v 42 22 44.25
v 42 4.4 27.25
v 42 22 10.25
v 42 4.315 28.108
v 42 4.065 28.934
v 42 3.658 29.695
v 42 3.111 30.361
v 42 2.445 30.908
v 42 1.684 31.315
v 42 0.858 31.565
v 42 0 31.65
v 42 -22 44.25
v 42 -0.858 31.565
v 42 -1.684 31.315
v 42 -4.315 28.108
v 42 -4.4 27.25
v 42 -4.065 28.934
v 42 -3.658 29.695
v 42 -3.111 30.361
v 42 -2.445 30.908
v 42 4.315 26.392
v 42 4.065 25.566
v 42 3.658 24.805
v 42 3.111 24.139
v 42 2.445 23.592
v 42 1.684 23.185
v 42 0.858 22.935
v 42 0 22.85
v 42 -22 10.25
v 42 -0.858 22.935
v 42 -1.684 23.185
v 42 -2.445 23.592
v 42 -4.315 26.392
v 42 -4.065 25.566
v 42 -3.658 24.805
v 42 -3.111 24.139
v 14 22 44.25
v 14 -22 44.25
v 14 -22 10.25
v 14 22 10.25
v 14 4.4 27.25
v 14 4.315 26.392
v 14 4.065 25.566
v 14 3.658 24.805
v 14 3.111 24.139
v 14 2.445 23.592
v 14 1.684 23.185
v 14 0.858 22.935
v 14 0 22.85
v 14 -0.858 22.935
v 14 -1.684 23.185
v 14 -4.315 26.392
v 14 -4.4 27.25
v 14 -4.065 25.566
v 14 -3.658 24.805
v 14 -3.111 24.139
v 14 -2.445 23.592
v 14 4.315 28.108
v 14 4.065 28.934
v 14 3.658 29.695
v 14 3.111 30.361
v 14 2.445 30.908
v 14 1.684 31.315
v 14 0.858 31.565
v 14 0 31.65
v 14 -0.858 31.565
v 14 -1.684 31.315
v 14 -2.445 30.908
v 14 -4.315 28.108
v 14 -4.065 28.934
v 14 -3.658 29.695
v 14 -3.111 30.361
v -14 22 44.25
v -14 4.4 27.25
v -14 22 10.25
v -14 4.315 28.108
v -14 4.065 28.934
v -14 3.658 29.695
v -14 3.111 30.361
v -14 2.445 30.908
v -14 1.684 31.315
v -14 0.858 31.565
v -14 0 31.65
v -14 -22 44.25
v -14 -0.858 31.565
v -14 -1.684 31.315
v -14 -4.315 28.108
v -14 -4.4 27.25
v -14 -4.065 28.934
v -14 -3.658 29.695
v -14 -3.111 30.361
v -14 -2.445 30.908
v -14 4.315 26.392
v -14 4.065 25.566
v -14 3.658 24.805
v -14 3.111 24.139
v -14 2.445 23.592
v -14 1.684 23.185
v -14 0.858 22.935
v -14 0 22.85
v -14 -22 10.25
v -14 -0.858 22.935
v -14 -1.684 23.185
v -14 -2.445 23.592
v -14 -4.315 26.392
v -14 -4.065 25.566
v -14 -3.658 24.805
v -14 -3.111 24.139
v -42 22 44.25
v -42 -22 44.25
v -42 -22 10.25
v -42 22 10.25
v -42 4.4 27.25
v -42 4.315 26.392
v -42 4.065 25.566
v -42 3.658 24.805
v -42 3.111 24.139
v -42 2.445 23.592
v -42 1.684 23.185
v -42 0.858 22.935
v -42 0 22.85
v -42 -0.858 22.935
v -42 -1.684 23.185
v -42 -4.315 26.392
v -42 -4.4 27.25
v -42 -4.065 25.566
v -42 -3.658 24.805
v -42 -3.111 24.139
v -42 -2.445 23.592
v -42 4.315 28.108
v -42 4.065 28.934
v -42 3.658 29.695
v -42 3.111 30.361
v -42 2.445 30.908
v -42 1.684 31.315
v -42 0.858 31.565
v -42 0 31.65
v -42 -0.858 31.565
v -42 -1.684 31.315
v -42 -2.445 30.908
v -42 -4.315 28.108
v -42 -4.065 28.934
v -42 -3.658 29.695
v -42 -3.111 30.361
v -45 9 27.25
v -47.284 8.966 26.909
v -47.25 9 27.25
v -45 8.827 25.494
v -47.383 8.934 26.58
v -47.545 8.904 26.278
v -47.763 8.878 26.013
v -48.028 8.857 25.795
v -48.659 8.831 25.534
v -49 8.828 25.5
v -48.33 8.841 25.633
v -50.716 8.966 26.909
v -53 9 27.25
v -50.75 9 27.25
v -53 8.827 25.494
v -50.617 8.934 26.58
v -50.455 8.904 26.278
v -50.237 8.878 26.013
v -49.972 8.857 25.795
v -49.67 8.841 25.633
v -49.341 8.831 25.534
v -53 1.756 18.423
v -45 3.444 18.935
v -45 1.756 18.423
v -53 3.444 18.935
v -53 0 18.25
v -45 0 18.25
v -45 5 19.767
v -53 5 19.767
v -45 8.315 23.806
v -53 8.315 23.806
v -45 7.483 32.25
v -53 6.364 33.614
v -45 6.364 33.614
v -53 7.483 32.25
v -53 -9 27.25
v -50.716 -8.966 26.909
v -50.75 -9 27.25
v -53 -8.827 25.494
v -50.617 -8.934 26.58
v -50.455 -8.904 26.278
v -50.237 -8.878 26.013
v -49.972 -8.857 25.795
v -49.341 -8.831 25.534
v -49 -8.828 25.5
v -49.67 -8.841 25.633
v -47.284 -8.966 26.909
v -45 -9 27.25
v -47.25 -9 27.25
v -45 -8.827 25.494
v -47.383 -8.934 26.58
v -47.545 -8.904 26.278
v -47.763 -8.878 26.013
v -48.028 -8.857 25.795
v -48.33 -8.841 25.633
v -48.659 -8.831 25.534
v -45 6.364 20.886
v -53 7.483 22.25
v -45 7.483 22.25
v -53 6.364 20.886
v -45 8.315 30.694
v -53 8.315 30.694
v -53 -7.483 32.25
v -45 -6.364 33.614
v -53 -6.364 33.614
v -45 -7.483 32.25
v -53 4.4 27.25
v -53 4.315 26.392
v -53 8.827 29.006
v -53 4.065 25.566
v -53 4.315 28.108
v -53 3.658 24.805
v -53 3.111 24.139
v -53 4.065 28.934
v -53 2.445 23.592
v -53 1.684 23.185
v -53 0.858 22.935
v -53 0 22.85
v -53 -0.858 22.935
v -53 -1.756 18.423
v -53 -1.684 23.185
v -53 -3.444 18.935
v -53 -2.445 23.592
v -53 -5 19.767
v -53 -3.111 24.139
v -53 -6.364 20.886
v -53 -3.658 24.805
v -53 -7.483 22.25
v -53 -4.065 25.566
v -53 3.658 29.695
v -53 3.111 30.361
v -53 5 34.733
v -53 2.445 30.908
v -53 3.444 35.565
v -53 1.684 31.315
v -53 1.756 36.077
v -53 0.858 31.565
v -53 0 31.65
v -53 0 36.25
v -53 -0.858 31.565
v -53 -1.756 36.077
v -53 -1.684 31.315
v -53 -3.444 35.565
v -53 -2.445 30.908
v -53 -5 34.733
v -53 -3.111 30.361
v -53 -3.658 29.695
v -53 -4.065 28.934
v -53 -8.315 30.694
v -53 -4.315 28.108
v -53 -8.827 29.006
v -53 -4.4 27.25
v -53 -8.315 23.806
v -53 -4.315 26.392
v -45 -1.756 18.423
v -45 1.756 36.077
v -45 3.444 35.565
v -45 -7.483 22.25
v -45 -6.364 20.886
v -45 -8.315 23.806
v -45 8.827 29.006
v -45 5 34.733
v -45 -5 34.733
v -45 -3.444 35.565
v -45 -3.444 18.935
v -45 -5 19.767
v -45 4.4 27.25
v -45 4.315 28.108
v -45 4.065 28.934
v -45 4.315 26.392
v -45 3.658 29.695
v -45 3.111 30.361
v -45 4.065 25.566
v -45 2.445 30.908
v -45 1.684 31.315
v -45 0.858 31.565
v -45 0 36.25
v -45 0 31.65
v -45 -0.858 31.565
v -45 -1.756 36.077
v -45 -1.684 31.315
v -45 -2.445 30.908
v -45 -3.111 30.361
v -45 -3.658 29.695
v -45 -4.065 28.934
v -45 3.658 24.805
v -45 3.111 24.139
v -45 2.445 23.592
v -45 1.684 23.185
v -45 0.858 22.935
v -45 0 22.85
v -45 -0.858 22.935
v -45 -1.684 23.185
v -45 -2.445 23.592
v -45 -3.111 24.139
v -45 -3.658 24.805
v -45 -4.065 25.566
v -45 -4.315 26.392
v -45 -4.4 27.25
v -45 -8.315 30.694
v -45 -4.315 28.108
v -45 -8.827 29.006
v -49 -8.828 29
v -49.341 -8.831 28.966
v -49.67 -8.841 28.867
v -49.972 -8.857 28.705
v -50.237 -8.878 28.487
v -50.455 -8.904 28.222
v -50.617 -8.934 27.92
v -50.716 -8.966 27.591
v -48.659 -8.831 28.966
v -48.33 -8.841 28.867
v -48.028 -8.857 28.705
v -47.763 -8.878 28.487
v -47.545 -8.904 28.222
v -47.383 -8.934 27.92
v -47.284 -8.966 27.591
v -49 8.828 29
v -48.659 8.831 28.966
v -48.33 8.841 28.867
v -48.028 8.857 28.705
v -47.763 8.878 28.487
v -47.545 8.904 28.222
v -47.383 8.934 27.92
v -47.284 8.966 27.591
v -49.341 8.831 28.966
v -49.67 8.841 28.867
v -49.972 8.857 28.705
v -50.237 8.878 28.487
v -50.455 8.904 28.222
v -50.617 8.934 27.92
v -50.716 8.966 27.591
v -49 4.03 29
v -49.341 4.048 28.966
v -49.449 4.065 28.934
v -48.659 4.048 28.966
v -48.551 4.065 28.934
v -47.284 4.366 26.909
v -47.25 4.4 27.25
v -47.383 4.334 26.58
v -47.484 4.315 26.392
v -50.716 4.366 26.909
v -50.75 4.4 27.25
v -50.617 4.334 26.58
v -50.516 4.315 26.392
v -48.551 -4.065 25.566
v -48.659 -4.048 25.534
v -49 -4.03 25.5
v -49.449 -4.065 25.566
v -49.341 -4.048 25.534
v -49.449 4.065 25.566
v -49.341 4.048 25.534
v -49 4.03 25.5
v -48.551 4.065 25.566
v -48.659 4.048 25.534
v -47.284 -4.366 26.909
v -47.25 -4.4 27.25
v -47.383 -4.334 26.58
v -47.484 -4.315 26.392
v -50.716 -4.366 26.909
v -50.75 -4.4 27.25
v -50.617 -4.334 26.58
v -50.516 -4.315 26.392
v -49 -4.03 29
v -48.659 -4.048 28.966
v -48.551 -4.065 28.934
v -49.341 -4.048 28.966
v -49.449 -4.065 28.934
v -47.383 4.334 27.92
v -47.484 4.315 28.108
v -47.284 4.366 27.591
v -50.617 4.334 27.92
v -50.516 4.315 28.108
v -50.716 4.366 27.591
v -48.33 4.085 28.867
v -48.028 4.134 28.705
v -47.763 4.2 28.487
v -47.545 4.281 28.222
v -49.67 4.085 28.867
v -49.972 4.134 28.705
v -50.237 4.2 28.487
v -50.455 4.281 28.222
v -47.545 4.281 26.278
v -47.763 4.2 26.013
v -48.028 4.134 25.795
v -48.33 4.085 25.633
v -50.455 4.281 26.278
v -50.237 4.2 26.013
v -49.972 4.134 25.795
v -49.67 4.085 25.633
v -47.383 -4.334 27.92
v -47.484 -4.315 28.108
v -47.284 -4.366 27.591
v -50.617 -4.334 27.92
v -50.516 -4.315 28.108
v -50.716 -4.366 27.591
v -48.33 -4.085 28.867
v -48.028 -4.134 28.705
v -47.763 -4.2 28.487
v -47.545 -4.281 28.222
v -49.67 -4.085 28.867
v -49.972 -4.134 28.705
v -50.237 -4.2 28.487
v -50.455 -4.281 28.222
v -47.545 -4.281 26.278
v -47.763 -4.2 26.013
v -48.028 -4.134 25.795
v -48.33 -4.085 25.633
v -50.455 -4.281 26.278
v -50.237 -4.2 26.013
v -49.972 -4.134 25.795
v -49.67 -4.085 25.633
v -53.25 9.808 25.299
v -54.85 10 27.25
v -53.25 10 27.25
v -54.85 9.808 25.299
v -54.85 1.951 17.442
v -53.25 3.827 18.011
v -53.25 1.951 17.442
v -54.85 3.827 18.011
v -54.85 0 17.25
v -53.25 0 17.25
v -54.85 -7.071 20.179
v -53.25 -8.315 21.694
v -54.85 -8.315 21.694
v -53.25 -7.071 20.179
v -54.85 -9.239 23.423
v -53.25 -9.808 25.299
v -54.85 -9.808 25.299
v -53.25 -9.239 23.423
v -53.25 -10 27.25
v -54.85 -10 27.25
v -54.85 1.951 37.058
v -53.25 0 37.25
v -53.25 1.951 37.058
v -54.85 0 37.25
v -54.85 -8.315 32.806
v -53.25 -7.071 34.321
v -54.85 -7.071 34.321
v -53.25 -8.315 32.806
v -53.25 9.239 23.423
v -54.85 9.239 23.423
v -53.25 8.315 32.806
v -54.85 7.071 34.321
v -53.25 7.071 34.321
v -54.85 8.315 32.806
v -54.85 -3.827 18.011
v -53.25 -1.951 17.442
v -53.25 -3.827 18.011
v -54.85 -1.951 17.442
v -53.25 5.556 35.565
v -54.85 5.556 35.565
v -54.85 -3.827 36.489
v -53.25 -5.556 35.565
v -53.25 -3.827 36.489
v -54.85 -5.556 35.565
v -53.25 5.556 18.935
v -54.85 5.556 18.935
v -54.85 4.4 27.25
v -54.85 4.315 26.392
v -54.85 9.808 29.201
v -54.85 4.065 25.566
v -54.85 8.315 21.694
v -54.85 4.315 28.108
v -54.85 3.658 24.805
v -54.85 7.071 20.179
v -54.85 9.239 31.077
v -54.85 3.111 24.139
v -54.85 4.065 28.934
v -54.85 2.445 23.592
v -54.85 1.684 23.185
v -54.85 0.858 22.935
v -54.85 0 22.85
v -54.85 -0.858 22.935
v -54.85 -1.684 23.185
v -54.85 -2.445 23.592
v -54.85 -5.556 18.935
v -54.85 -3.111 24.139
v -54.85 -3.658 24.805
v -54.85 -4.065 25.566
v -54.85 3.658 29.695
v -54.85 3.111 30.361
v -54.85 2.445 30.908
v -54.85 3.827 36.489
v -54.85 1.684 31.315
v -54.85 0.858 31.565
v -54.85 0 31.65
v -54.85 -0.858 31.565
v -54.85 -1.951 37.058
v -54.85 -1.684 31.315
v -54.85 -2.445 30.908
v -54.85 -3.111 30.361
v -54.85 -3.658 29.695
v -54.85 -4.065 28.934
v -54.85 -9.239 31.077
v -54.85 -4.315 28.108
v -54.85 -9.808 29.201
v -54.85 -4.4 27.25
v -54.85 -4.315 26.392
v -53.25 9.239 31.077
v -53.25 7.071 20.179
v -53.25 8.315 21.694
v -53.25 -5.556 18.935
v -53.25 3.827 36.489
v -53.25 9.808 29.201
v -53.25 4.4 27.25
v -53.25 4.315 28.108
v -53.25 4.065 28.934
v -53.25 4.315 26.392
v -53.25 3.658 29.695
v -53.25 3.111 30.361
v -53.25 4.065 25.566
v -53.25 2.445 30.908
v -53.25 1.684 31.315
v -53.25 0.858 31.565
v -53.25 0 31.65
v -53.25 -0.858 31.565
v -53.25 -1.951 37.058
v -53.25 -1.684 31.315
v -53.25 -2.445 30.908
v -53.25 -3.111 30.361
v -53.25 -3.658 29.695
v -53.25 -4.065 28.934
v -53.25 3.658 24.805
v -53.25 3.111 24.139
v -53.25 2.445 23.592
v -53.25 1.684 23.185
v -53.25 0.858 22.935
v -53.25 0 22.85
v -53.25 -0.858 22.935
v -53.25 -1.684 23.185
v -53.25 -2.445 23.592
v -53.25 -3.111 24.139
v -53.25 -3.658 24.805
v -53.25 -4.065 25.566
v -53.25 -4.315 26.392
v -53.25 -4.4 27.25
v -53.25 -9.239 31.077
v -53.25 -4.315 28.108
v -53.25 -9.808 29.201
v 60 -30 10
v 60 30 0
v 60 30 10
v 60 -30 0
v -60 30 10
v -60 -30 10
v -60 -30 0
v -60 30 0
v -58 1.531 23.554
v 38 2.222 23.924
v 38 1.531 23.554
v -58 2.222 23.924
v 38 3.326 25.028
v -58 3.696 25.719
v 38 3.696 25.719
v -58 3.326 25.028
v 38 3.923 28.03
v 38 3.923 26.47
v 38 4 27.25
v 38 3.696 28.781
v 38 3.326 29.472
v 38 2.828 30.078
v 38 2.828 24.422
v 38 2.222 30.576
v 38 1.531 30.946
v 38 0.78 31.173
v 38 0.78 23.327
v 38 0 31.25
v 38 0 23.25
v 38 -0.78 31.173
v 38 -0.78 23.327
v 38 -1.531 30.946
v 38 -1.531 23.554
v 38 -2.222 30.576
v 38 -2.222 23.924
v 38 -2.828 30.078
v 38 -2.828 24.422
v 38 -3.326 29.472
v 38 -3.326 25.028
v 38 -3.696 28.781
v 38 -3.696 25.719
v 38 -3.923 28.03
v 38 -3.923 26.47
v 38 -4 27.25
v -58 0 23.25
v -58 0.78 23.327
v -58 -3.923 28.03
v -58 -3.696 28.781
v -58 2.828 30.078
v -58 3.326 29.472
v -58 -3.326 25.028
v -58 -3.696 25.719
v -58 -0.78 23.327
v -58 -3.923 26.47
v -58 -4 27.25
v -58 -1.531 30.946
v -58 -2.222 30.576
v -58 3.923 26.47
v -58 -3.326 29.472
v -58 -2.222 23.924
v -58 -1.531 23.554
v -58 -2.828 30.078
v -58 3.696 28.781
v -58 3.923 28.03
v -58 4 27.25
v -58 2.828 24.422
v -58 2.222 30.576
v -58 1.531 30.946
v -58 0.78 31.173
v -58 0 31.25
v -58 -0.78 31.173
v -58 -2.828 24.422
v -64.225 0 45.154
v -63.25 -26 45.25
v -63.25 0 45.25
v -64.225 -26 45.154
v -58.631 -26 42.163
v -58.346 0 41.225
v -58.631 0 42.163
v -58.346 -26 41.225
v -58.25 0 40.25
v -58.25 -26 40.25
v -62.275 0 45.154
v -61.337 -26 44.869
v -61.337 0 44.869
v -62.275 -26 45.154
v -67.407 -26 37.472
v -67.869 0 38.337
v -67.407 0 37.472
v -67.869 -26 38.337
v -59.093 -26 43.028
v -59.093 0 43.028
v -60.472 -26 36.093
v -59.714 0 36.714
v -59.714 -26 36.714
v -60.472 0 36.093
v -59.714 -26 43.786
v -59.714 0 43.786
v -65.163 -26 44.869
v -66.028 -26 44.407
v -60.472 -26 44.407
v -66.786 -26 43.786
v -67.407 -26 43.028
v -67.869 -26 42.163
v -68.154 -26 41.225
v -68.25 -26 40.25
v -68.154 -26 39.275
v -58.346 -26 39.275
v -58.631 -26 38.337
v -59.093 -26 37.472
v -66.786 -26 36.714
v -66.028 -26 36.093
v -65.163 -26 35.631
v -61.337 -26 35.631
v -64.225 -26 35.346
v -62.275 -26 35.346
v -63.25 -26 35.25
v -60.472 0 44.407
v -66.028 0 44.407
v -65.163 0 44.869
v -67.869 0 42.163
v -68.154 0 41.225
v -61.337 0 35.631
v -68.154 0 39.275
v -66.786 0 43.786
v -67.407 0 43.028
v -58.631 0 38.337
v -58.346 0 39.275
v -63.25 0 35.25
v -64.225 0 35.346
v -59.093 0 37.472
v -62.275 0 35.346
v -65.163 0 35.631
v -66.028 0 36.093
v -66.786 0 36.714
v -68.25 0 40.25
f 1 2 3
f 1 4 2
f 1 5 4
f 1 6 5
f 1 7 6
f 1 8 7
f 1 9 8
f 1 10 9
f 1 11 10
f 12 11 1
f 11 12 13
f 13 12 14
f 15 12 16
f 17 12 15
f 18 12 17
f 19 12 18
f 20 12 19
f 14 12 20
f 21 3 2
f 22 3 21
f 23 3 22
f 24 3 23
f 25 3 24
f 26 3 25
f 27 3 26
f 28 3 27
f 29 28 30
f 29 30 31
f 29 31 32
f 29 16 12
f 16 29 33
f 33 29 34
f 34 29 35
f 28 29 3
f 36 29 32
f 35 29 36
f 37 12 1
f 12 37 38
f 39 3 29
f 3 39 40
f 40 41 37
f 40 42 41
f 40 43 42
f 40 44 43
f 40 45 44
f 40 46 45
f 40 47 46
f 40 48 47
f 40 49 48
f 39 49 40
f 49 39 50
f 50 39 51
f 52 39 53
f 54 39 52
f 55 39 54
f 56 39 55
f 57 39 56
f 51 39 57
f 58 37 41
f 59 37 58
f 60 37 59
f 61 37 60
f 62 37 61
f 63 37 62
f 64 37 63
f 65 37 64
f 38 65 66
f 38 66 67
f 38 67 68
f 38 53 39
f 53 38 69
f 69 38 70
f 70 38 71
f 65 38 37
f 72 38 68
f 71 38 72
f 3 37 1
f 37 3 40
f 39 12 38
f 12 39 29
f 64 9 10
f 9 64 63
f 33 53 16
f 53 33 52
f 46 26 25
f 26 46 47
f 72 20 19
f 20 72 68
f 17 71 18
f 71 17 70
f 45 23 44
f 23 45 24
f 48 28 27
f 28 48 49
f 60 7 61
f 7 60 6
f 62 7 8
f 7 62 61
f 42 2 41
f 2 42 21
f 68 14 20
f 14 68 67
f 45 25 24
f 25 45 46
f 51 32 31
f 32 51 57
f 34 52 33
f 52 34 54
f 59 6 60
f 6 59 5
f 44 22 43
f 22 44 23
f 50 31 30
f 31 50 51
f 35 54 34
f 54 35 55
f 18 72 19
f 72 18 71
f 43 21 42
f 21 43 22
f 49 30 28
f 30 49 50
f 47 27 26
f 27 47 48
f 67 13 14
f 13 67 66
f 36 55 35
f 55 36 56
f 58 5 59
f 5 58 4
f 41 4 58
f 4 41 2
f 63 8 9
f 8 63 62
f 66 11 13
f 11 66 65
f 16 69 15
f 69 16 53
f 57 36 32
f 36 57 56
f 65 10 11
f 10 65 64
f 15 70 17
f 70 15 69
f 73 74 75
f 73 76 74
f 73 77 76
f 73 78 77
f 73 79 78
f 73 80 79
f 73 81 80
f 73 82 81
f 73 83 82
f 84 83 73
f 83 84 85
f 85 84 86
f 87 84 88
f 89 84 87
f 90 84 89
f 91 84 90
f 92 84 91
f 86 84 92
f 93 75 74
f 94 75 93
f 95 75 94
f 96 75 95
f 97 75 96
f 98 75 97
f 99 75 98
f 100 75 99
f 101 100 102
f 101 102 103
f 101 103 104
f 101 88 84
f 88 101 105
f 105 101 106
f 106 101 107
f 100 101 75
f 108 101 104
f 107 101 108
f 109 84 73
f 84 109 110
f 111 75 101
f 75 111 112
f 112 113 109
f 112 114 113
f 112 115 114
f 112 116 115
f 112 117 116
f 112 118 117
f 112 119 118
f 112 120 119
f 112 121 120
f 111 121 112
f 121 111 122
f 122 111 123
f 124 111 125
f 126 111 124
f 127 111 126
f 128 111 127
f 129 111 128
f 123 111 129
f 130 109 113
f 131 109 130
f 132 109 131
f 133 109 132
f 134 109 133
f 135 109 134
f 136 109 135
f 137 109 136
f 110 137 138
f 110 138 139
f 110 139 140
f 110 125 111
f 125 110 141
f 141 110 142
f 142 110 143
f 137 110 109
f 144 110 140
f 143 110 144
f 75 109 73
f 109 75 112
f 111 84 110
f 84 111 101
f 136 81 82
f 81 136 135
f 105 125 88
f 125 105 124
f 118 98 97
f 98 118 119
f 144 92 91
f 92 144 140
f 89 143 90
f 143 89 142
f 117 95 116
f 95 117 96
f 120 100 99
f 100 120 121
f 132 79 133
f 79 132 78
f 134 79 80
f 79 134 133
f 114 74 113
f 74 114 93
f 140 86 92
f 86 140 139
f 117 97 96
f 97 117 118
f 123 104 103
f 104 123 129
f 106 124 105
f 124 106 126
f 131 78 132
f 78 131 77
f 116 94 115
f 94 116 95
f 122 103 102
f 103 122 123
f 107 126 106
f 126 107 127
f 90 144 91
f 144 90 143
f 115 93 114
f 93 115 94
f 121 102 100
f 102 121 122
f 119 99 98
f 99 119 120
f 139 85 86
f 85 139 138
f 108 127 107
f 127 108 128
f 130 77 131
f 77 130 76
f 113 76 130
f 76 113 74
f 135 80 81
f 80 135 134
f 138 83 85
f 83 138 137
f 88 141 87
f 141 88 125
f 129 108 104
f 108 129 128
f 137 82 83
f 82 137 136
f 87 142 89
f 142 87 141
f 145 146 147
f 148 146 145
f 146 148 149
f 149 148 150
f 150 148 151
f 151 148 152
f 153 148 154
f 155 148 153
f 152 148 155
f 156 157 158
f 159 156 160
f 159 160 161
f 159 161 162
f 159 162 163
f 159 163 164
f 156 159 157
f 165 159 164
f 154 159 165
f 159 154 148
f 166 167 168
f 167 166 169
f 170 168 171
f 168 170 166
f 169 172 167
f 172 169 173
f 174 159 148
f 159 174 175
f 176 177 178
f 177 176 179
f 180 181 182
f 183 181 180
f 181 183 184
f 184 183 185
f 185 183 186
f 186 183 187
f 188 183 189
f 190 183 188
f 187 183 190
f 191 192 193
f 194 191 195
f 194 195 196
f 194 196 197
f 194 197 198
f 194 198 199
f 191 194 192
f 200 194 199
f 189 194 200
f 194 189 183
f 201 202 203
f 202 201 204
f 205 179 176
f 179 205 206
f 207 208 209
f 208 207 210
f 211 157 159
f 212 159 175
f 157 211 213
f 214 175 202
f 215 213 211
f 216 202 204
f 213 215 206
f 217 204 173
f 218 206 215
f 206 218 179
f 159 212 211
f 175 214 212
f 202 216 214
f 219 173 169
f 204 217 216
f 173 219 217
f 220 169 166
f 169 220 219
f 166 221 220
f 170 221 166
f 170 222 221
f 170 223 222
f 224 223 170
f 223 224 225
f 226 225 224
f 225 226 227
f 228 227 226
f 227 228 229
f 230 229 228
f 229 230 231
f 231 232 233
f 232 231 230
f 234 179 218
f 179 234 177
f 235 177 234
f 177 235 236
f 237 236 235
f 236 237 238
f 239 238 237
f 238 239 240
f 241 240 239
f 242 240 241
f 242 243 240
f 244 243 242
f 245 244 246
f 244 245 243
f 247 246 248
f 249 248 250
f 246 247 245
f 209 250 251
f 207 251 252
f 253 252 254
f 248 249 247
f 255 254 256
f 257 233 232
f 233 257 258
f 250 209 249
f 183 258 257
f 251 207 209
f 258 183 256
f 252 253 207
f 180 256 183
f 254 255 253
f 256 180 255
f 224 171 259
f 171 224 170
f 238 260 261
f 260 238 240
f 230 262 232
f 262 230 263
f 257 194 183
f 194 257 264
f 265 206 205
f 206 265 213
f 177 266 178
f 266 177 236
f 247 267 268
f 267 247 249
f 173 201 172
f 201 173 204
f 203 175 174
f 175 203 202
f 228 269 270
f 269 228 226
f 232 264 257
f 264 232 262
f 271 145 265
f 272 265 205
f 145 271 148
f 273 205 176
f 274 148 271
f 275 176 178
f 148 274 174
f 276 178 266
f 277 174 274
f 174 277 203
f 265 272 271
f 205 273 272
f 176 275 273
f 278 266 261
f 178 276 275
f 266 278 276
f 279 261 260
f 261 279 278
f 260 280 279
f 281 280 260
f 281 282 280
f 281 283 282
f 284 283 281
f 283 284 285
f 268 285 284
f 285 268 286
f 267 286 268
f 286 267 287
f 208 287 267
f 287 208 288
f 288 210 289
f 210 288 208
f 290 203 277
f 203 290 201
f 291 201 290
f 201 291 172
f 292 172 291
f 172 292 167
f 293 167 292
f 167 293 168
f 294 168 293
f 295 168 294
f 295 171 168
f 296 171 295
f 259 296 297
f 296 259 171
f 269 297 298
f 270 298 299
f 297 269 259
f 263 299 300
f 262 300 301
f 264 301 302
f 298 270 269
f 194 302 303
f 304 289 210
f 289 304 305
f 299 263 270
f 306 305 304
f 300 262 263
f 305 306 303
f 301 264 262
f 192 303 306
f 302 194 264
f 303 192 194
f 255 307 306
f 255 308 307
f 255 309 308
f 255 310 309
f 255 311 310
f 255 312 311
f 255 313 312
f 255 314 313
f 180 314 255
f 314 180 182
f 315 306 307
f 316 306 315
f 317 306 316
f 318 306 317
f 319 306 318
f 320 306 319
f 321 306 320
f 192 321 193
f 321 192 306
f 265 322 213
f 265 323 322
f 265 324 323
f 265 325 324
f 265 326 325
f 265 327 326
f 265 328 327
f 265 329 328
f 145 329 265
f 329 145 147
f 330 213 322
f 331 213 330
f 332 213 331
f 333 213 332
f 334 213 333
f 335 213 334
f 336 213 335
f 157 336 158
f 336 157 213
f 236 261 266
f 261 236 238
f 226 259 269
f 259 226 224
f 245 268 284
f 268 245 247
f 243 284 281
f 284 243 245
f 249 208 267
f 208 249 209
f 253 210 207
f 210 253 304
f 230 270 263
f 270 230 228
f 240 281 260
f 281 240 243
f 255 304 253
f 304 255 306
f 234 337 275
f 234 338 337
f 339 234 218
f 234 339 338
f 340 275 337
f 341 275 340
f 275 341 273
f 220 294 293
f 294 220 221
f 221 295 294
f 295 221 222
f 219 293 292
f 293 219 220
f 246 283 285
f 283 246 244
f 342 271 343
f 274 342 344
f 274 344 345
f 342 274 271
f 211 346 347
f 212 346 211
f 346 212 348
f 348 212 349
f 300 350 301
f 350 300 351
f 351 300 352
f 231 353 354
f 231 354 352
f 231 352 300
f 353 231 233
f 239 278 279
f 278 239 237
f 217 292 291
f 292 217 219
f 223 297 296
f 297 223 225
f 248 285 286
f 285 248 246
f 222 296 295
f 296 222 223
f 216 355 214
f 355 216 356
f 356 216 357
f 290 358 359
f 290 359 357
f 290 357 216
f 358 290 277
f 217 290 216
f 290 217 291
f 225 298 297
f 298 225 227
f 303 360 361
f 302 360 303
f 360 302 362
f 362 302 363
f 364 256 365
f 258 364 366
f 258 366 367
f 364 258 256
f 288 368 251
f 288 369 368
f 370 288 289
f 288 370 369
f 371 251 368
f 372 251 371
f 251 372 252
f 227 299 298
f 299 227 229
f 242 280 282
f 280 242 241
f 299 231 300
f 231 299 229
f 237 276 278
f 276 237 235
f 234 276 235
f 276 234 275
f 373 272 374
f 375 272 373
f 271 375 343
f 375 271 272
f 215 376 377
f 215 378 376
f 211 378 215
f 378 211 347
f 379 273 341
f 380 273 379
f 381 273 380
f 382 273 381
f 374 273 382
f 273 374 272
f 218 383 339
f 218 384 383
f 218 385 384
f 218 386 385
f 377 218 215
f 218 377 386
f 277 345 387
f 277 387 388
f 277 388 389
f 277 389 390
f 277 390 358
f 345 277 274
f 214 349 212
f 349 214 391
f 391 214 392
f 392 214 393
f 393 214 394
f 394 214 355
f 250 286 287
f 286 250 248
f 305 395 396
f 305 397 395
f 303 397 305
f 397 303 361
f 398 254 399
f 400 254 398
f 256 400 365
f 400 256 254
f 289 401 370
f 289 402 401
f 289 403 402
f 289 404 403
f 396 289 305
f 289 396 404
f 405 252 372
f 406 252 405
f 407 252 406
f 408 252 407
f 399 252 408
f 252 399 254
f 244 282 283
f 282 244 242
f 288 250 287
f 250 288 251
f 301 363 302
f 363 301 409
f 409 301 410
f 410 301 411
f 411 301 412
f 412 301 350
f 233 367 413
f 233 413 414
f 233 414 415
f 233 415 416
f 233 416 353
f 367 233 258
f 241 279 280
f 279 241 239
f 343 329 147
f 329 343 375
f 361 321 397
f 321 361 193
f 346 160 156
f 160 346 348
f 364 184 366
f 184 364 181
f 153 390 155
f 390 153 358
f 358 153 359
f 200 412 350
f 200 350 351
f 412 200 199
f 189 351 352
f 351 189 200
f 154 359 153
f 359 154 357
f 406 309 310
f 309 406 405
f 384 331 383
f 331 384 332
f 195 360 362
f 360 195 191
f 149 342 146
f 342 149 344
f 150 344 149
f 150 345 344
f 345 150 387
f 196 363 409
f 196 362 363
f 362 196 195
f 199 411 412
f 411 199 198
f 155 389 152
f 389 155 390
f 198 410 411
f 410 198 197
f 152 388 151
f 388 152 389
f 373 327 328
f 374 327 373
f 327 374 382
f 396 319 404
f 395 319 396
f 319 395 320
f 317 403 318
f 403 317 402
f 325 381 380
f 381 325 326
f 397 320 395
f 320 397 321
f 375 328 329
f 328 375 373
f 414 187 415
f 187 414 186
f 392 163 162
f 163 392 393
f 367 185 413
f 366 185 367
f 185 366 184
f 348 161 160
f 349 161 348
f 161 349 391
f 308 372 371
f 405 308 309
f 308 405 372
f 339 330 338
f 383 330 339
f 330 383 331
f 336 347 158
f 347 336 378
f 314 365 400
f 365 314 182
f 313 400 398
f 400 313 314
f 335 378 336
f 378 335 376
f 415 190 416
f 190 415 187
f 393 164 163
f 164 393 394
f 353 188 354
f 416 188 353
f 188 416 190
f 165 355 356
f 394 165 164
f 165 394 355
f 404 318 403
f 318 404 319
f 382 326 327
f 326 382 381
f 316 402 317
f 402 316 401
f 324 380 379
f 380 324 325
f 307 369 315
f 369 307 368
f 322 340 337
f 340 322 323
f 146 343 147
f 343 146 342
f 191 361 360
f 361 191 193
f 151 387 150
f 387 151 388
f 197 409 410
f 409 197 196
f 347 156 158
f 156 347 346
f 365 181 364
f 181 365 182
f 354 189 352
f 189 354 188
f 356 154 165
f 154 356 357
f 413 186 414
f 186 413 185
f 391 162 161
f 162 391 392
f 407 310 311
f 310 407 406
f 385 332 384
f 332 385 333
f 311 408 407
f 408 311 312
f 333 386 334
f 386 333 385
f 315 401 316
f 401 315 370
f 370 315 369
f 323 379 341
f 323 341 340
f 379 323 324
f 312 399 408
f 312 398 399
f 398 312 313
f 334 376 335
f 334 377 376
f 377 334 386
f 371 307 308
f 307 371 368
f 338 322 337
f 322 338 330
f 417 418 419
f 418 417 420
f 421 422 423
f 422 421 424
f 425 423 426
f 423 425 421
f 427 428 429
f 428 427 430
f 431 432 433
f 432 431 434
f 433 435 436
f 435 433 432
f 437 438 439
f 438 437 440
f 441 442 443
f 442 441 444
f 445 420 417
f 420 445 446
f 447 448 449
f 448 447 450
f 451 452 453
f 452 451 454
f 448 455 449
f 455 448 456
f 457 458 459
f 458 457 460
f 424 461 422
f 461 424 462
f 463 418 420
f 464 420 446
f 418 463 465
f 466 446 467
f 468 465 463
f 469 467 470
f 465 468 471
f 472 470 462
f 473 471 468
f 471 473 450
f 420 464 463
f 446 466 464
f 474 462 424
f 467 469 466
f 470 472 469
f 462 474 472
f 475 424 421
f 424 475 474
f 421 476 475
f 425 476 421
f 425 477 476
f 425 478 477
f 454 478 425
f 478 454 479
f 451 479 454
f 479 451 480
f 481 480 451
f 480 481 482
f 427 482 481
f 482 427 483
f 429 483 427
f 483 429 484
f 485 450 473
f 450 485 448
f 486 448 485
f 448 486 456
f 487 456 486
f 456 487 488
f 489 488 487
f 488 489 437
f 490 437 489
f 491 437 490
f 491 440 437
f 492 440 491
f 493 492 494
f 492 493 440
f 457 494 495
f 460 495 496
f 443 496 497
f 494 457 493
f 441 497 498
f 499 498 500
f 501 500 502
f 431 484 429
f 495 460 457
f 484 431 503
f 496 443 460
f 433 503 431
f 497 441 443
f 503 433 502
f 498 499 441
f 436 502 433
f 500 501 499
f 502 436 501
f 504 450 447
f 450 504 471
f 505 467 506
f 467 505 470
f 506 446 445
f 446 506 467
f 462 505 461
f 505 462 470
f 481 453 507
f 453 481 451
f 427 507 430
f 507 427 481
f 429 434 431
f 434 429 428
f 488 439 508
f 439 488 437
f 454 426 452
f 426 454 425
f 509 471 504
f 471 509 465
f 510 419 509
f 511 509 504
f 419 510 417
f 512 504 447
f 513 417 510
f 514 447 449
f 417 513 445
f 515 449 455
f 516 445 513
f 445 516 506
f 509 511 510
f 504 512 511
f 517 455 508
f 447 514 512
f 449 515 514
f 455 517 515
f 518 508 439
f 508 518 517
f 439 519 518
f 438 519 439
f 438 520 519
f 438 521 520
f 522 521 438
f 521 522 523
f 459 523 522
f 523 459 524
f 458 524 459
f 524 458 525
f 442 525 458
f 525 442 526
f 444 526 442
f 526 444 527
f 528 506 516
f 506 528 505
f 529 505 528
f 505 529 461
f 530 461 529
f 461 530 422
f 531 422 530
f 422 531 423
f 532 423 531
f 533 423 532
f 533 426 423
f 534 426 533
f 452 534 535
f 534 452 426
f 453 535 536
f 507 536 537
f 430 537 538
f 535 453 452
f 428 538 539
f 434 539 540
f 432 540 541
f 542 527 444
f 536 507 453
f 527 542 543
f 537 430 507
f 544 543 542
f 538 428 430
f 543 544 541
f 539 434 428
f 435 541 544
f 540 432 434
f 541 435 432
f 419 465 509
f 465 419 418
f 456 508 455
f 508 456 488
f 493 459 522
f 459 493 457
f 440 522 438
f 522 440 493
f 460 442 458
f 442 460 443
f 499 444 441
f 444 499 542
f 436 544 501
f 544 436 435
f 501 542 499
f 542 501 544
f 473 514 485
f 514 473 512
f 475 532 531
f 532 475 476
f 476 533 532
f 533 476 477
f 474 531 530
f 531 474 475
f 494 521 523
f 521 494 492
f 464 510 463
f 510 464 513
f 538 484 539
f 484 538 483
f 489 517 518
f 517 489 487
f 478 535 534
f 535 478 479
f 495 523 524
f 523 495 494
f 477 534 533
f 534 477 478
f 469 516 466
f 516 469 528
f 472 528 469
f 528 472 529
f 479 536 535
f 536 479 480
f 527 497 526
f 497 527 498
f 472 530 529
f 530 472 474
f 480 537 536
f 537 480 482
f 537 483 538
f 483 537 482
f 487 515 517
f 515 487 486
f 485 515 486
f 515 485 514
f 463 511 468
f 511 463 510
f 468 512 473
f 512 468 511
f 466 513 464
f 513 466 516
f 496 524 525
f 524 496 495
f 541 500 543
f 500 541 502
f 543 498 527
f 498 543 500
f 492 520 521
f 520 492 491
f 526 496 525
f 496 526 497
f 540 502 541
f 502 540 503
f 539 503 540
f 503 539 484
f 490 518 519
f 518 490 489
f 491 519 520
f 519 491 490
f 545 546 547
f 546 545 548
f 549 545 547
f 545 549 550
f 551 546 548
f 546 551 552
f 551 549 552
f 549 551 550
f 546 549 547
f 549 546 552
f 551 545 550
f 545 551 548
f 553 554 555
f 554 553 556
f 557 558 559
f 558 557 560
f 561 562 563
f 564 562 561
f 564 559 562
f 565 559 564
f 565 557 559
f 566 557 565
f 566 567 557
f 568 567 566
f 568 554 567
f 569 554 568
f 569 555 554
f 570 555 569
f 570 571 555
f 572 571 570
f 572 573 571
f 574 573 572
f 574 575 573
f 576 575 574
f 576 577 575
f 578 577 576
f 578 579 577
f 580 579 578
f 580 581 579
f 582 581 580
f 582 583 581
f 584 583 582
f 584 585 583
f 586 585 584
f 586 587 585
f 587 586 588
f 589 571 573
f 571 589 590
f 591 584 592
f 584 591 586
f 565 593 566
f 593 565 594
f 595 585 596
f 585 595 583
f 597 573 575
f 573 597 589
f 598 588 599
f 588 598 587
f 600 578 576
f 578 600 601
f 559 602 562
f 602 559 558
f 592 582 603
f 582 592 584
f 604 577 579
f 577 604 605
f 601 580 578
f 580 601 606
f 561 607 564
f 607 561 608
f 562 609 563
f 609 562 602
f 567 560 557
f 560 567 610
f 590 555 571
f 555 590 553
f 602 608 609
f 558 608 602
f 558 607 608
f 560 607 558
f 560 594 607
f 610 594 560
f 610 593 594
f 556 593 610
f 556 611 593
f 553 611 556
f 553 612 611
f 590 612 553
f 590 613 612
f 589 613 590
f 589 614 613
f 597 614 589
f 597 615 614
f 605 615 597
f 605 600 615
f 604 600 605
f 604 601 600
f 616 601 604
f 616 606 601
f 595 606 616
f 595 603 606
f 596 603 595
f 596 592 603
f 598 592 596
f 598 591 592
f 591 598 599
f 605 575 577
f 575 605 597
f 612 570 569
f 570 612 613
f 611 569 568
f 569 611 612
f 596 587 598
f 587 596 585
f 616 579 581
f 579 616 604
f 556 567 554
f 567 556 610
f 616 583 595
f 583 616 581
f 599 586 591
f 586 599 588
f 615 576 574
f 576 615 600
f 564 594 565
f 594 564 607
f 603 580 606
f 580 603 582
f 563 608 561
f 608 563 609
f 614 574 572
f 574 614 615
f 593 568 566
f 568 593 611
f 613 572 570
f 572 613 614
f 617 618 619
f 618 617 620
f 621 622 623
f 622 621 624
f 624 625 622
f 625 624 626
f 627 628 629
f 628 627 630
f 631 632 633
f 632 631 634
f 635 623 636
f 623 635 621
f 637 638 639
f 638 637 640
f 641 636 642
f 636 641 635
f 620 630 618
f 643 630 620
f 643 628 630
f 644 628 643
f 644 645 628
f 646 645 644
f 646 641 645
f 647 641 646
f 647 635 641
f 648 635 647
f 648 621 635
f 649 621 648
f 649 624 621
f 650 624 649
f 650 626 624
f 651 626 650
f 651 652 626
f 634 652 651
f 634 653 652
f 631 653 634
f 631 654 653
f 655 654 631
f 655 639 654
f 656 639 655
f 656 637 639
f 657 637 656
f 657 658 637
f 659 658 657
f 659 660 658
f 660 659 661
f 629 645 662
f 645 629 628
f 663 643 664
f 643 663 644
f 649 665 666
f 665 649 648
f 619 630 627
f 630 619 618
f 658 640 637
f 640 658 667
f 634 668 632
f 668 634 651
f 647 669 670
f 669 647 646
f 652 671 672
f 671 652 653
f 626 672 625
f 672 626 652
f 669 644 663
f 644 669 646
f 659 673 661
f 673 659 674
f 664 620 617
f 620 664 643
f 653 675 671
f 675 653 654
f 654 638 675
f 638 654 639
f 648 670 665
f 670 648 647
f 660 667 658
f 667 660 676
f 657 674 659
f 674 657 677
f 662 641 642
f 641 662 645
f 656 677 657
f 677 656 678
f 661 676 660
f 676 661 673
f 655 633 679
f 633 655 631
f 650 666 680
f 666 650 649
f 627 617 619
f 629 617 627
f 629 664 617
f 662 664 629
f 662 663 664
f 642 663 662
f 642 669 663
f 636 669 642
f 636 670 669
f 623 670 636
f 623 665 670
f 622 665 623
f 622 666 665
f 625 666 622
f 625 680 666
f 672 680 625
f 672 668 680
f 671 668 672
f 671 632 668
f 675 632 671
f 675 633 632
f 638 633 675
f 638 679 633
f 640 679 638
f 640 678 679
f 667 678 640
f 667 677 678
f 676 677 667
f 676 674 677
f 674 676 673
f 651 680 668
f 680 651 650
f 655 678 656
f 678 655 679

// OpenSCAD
$fn = 32;

// ------------------------------------------------------------------------
// Machine vise: screw d8, jaws 28 x 34 mm
// Every part is its own module, assembly() places every instance.
// ------------------------------------------------------------------------

// --- part 1 ---
module vise_bed() {
  difference() {
    translate([-60, -30, 0]) cube([120, 60, 10]);
  }
}

// --- part 2 ---
module vise_jaw() {
  difference() {
    translate([-14, -22, 0]) cube([28, 44, 34]);
    translate([0, 0, 17]) rotate([0, 90, 0]) cylinder(h = 30, d = 8.8, center = true);
  }
}

// --- part 3 ---
module vise_screw() {
  translate([0, 0, -48]) cylinder(h = 96, d = 8);
}

// --- part 4 ---
module screw_collar() {
  difference() {
    cylinder(h = 8, d = 18);
    translate([0, 0, -1]) cylinder(h = 10, d = 8.8);
    translate([0, 0, 4]) rotate([90, 0, 0]) cylinder(h = 20, d = 3.5, center = true);
  }
}

// --- part 5 ---
module screw_washer() {
  difference() {
      translate([0, 0, 0]) cylinder(h = 1.6, d = 20);
      translate([0, 0, -1]) cylinder(h = 3.6, d = 8.8);
    }
}

// --- part 6 ---
module vise_handle() {
  cylinder(h = 26, d = 10);
}

// --- assembly ---
module assembly() {
  color([0.80, 0.24, 0.20]) translate([0, 0, 0]) rotate([0, 0, 0]) vise_bed();
  color([0.20, 0.45, 0.75]) translate([28, 0, 10.25]) rotate([0, 0, 0]) vise_jaw();
  color([0.25, 0.62, 0.32]) translate([-28, 0, 10.25]) rotate([0, 0, 0]) vise_jaw();
  color([0.92, 0.70, 0.18]) translate([-10, 0, 27.25]) rotate([0, 90, 0]) vise_screw();
  color([0.58, 0.35, 0.70]) translate([-53, 0, 27.25]) rotate([0, 90, 0]) screw_collar();
  color([0.16, 0.66, 0.66]) translate([-54.85, 0, 27.25]) rotate([0, 90, 0]) screw_washer();
  color([0.85, 0.48, 0.18]) translate([-63.25, 0, 40.25]) rotate([90, 0, 0]) vise_handle();
}

assembly();
